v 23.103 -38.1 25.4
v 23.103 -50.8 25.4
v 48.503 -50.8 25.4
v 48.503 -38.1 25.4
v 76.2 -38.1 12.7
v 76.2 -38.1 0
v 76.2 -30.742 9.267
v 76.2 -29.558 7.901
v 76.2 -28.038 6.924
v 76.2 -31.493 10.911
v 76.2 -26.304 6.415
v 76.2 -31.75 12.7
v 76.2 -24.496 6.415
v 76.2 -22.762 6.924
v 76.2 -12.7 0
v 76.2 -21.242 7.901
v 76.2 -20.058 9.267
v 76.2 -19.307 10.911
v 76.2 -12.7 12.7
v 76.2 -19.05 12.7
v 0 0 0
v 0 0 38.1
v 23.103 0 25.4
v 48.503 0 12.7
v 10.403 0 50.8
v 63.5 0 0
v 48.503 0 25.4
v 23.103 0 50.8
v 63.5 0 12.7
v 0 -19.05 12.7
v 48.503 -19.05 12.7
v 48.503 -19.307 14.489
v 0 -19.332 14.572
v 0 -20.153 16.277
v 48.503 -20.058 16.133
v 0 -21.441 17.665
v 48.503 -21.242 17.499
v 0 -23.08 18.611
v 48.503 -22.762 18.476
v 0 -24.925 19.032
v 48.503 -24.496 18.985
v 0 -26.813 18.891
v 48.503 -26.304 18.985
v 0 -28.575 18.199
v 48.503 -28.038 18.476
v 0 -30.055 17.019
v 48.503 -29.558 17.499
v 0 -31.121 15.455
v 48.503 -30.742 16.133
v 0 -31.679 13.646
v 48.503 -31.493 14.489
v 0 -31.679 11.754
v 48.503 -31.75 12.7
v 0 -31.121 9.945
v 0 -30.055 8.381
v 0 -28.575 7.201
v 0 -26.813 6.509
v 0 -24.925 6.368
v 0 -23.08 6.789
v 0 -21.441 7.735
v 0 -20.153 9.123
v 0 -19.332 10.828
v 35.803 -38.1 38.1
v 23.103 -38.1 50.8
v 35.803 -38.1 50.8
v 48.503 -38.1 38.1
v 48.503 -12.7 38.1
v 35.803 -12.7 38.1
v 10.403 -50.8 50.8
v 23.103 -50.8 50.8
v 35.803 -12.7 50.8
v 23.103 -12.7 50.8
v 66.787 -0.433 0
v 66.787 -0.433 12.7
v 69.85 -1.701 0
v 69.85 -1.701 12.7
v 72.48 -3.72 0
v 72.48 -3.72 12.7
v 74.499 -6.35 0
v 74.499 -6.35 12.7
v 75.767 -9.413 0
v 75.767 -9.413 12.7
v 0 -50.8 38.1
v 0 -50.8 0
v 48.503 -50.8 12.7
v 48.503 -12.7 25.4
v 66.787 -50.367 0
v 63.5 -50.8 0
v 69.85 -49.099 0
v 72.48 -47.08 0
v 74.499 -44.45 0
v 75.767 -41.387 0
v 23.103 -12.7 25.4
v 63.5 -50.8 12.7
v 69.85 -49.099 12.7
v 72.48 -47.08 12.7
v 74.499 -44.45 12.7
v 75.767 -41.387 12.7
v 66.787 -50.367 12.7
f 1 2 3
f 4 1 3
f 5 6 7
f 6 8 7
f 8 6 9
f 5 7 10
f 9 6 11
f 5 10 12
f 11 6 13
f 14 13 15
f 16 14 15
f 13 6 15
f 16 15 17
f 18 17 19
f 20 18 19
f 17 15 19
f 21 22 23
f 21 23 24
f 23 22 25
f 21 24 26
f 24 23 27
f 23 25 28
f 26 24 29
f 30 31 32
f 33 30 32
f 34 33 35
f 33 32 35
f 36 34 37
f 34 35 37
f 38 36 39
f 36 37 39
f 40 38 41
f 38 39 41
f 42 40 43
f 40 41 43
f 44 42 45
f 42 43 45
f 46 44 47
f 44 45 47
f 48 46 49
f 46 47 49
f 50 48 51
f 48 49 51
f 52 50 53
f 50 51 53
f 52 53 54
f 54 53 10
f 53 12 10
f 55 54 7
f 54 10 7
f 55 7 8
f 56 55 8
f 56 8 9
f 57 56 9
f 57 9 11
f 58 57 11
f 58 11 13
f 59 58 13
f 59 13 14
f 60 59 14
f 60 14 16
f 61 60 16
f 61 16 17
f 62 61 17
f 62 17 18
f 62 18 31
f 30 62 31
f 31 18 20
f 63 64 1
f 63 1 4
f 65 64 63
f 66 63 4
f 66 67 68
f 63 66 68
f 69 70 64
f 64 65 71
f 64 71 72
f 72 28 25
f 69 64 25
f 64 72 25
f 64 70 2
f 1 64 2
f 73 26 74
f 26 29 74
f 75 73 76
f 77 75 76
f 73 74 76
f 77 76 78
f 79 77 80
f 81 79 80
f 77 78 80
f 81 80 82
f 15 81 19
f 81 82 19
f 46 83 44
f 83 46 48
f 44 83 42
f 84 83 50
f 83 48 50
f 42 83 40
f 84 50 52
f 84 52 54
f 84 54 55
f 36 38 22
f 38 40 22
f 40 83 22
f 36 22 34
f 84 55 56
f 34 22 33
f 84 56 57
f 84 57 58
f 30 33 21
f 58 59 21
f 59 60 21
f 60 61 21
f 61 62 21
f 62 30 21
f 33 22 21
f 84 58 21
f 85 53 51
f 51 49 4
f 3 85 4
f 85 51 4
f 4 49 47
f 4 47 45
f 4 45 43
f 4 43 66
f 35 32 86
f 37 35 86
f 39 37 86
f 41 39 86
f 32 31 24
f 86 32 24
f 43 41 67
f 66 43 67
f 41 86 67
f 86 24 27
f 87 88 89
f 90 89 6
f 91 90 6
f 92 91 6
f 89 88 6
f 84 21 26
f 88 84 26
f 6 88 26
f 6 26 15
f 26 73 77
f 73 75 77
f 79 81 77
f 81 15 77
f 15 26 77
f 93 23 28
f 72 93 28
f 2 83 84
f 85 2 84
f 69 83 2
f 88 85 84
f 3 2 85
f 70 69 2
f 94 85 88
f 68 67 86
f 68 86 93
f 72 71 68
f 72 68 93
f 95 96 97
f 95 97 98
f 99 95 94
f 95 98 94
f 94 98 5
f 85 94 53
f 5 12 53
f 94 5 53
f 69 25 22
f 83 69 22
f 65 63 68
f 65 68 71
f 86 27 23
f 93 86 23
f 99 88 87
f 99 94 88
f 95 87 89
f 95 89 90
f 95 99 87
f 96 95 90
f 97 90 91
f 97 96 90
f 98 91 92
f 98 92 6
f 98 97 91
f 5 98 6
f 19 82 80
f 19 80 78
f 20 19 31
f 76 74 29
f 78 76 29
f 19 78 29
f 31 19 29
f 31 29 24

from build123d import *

# Parameters (mm, degrees)
F1_DEPTH = 50.8
F3_DEPTH = 12.7
F5_DEPTH = 12.7
F7_DEPTH = 76.201
F8_R     = 12.7


with BuildPart() as f1:
    # F0 (on Front) → F1 (new body)
    with BuildSketch(Plane.XZ):
        Polygon((0, 38.1), (0, 0), (76.2, 0), (76.2, 12.7), (48.502727, 12.7), (48.502727, 38.1), (35.802727, 38.1), (35.802727, 50.8), (10.402727, 50.8), align=None)
    extrude(amount=F1_DEPTH)

    # F2 (on face) → F3 (cut)
    with BuildSketch(Plane.XZ.offset(50.8)):
        Polygon((35.802727, 50.8), (23.102727, 50.8), (23.102727, 25.400003), (48.502727, 25.4), (48.502727, 38.1), (35.802727, 38.1), align=None)
    extrude(amount=-F3_DEPTH, mode=Mode.SUBTRACT)

    # F4 (on face) → F5 (cut)
    with BuildSketch(Plane(origin=(0, 0, 0), x_dir=(-1, 0, 0), z_dir=(0, 1, 0))):
        Polygon((-23.102727, 25.4), (-23.102727, 50.8), (-35.802727, 50.8), (-35.802727, 38.1), (-48.502727, 38.1), (-48.502727, 25.4), align=None)
    extrude(amount=-F5_DEPTH, mode=Mode.SUBTRACT)

    # F6 (on face) → F7 (cut, through all)
    with BuildSketch(Plane.YZ.offset(76.2)):
        with BuildLine():
            ThreePointArc((-31.75, 12.7), (-25.4, 6.35), (-19.05, 12.7))
            Line((-19.05, 12.7), (-31.75, 12.7))
        make_face()
        with BuildLine():
            Line((-31.75, 12.7), (-19.05, 12.7))
            ThreePointArc((-19.05, 12.7), (-25.4, 19.05), (-31.75, 12.7))
        make_face()
    extrude(amount=-F7_DEPTH, mode=Mode.SUBTRACT)

    # F8
    f8_edges = [f1.edges().sort_by_distance(p)[0] for p in [
        (76.2, -50.8, 6.35),
        (76.2, 0, 6.35),
    ]]
    fillet(f8_edges, radius=F8_R)


solid = f1.part
